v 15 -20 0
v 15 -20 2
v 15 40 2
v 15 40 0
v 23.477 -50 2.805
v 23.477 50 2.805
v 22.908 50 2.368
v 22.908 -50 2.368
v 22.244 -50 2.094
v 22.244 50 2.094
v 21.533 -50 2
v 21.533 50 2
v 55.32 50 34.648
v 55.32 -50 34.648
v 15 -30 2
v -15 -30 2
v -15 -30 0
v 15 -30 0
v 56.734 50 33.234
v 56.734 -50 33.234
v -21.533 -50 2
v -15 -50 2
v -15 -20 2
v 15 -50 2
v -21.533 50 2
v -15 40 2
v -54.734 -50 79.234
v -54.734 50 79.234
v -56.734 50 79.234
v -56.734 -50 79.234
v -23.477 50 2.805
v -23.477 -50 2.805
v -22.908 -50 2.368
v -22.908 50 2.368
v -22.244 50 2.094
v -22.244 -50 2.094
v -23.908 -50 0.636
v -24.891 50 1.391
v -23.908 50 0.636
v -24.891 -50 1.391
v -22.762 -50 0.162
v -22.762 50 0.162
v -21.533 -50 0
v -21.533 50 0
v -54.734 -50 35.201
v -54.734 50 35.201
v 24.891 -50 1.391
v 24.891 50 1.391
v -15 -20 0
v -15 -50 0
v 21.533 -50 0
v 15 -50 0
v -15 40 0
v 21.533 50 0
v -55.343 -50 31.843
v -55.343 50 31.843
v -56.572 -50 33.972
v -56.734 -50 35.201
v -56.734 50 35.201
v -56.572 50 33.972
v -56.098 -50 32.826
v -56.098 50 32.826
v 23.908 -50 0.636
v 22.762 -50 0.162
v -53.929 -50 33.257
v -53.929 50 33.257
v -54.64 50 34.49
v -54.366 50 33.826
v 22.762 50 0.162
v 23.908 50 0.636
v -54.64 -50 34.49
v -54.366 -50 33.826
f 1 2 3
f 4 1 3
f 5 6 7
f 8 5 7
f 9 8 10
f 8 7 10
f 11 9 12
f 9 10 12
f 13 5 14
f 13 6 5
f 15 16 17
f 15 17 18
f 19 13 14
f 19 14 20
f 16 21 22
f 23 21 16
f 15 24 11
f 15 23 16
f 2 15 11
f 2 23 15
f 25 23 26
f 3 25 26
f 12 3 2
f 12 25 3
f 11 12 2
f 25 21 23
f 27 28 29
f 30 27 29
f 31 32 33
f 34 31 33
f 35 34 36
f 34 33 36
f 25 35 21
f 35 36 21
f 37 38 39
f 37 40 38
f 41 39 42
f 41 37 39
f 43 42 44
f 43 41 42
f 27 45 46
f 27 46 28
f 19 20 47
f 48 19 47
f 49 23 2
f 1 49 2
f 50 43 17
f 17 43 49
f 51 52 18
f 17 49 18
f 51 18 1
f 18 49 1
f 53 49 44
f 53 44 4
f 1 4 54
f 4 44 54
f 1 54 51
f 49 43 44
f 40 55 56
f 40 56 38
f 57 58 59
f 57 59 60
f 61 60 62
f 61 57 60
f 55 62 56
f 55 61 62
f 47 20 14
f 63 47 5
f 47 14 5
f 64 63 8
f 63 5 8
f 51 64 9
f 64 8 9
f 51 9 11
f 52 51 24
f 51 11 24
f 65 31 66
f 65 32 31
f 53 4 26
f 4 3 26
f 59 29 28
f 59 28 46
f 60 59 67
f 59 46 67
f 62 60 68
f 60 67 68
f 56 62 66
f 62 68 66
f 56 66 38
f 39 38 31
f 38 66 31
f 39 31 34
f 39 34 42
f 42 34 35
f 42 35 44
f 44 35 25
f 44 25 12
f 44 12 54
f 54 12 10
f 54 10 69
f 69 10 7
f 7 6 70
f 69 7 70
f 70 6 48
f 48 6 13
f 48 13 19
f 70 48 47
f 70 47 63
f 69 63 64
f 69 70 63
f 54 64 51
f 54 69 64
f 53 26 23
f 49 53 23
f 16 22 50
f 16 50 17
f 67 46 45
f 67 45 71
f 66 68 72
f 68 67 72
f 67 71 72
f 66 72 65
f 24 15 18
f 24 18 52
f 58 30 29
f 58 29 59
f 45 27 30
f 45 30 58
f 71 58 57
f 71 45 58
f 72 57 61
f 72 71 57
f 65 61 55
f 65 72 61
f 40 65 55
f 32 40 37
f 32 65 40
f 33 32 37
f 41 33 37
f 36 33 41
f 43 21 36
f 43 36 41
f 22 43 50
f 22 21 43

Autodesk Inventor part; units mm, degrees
ref_plane "YZ Plane" through (0, 0, 0) normal (1, 0, 0) x (0, 1, 0)
ref_plane "XZ Plane" through (0, 0, 0) normal (0, 1, 0) x (-1, 0, 0)
ref_plane "XY Plane" through (0, 0, 0) normal (0, 0, 1) x (1, 0, 0)
sketch "Sketch1" plane through (0, 0, 0) normal (0, 0, 1) x (1, 0, 0)
  line L0 (-23.5, -50) -> (23.5, -50)
  line L1 (23.5, -50) -> (23.5, 50)
  line L2 (23.5, 50) -> (-23.5, 50)
  line L3 (-23.5, 50) -> (-23.5, -50)
  line L4 (-23.5, -50) -> (23.5, 50) construction
  line L5 (23.5, -50) -> (-23.5, 50) construction
  point P0 (0, 0)
  dimension "d154" = 47
  dimension "d155" = 100
extrude "Plate3" add sketch "Sketch1" along normal blind 2
sketch "Sketch7" plane through (22.0858, 50, 1.4142) normal (0.7071068, 0, -0.7071068) x (0, 1, 0)
  line L0 (-100, 0) -> (0, 0)
  line L1 (0, 0) -> (0, 47)
  line L2 (0, 47) -> (-100, 47)
  line L3 (-100, 47) -> (-100, 0)
edge flange "Flange3" height 47 angle 45 thickness 2 bend radius 2.75 thickness toward (0.7071068, 0, -0.7071068) relief round relief width 2 relief depth 1 corner gap 2.75 corner form 0 edges at (23.5, 0, 2) (-23.5, 0, 2) wall of the first edge with corners at (22.0858, -50, 1.4142) (22.0858, 50, 1.4142) (55.3198, 50, 34.6482) (55.3198, -50, 34.6482)
bend "Bend3"
corner "Corner3"
sketch "Sketch8" plane through (0, 0, 2) normal (0, 0, 1) x (1, 0, 0)
  line L0 (15, 40) -> (-15, 40)
  line L1 (-15, 40) -> (-15, -20)
  line L2 (-15, -20) -> (15, -20)
  line L3 (15, -20) -> (15, 40)
  line L4 (15, 40) -> (-15, -20) construction
  line L5 (-15, 40) -> (15, -20) construction
  line L6 (-23.5, 50) -> (21.5325, 50) projected
  line L7 (-21.5325, -50) -> (21.5325, -50) projected
  line L8 (15, -50) -> (-15, -50)
  line L9 (-15, -50) -> (-15, -30)
  line L10 (-15, -30) -> (15, -30)
  line L11 (15, -30) -> (15, -50)
  point P0 (0, 0)
  point P1 (0, 10)
  point P2 (-15, -50)
  dimension "d166" = 30
  dimension "d168" = 10
  dimension "d182" = 10
  dimension "d183" = 20
extrude "Cut1" cut sketch "Sketch8" against normal blind 2
sketch "Sketch9" plane through (-54.734, -50, 33.234) normal (-1, 0, 0) x (0, -1, 0)
  line L0 (-100, 0) -> (0, 0)
  line L1 (0, 0) -> (0, 46)
  line L2 (0, 46) -> (-100, 46)
  line L3 (-100, 46) -> (-100, 0)
edge flange "Flange4" height 46 angle 45 thickness 2 bend radius 2.75 thickness toward (-1, 0, 0) relief round relief width 2 relief depth 1 edges at (-55.3198, 0, 34.6482) wall of the first edge with corners at (-54.734, 50, 33.234) (-54.734, -50, 33.234) (-54.734, -50, 79.234) (-54.734, 50, 79.234)
bend "Bend4"
corner "Corner4"
properties part number "MNT-CDF-503  main tube 1" material "Stainless Steel"
